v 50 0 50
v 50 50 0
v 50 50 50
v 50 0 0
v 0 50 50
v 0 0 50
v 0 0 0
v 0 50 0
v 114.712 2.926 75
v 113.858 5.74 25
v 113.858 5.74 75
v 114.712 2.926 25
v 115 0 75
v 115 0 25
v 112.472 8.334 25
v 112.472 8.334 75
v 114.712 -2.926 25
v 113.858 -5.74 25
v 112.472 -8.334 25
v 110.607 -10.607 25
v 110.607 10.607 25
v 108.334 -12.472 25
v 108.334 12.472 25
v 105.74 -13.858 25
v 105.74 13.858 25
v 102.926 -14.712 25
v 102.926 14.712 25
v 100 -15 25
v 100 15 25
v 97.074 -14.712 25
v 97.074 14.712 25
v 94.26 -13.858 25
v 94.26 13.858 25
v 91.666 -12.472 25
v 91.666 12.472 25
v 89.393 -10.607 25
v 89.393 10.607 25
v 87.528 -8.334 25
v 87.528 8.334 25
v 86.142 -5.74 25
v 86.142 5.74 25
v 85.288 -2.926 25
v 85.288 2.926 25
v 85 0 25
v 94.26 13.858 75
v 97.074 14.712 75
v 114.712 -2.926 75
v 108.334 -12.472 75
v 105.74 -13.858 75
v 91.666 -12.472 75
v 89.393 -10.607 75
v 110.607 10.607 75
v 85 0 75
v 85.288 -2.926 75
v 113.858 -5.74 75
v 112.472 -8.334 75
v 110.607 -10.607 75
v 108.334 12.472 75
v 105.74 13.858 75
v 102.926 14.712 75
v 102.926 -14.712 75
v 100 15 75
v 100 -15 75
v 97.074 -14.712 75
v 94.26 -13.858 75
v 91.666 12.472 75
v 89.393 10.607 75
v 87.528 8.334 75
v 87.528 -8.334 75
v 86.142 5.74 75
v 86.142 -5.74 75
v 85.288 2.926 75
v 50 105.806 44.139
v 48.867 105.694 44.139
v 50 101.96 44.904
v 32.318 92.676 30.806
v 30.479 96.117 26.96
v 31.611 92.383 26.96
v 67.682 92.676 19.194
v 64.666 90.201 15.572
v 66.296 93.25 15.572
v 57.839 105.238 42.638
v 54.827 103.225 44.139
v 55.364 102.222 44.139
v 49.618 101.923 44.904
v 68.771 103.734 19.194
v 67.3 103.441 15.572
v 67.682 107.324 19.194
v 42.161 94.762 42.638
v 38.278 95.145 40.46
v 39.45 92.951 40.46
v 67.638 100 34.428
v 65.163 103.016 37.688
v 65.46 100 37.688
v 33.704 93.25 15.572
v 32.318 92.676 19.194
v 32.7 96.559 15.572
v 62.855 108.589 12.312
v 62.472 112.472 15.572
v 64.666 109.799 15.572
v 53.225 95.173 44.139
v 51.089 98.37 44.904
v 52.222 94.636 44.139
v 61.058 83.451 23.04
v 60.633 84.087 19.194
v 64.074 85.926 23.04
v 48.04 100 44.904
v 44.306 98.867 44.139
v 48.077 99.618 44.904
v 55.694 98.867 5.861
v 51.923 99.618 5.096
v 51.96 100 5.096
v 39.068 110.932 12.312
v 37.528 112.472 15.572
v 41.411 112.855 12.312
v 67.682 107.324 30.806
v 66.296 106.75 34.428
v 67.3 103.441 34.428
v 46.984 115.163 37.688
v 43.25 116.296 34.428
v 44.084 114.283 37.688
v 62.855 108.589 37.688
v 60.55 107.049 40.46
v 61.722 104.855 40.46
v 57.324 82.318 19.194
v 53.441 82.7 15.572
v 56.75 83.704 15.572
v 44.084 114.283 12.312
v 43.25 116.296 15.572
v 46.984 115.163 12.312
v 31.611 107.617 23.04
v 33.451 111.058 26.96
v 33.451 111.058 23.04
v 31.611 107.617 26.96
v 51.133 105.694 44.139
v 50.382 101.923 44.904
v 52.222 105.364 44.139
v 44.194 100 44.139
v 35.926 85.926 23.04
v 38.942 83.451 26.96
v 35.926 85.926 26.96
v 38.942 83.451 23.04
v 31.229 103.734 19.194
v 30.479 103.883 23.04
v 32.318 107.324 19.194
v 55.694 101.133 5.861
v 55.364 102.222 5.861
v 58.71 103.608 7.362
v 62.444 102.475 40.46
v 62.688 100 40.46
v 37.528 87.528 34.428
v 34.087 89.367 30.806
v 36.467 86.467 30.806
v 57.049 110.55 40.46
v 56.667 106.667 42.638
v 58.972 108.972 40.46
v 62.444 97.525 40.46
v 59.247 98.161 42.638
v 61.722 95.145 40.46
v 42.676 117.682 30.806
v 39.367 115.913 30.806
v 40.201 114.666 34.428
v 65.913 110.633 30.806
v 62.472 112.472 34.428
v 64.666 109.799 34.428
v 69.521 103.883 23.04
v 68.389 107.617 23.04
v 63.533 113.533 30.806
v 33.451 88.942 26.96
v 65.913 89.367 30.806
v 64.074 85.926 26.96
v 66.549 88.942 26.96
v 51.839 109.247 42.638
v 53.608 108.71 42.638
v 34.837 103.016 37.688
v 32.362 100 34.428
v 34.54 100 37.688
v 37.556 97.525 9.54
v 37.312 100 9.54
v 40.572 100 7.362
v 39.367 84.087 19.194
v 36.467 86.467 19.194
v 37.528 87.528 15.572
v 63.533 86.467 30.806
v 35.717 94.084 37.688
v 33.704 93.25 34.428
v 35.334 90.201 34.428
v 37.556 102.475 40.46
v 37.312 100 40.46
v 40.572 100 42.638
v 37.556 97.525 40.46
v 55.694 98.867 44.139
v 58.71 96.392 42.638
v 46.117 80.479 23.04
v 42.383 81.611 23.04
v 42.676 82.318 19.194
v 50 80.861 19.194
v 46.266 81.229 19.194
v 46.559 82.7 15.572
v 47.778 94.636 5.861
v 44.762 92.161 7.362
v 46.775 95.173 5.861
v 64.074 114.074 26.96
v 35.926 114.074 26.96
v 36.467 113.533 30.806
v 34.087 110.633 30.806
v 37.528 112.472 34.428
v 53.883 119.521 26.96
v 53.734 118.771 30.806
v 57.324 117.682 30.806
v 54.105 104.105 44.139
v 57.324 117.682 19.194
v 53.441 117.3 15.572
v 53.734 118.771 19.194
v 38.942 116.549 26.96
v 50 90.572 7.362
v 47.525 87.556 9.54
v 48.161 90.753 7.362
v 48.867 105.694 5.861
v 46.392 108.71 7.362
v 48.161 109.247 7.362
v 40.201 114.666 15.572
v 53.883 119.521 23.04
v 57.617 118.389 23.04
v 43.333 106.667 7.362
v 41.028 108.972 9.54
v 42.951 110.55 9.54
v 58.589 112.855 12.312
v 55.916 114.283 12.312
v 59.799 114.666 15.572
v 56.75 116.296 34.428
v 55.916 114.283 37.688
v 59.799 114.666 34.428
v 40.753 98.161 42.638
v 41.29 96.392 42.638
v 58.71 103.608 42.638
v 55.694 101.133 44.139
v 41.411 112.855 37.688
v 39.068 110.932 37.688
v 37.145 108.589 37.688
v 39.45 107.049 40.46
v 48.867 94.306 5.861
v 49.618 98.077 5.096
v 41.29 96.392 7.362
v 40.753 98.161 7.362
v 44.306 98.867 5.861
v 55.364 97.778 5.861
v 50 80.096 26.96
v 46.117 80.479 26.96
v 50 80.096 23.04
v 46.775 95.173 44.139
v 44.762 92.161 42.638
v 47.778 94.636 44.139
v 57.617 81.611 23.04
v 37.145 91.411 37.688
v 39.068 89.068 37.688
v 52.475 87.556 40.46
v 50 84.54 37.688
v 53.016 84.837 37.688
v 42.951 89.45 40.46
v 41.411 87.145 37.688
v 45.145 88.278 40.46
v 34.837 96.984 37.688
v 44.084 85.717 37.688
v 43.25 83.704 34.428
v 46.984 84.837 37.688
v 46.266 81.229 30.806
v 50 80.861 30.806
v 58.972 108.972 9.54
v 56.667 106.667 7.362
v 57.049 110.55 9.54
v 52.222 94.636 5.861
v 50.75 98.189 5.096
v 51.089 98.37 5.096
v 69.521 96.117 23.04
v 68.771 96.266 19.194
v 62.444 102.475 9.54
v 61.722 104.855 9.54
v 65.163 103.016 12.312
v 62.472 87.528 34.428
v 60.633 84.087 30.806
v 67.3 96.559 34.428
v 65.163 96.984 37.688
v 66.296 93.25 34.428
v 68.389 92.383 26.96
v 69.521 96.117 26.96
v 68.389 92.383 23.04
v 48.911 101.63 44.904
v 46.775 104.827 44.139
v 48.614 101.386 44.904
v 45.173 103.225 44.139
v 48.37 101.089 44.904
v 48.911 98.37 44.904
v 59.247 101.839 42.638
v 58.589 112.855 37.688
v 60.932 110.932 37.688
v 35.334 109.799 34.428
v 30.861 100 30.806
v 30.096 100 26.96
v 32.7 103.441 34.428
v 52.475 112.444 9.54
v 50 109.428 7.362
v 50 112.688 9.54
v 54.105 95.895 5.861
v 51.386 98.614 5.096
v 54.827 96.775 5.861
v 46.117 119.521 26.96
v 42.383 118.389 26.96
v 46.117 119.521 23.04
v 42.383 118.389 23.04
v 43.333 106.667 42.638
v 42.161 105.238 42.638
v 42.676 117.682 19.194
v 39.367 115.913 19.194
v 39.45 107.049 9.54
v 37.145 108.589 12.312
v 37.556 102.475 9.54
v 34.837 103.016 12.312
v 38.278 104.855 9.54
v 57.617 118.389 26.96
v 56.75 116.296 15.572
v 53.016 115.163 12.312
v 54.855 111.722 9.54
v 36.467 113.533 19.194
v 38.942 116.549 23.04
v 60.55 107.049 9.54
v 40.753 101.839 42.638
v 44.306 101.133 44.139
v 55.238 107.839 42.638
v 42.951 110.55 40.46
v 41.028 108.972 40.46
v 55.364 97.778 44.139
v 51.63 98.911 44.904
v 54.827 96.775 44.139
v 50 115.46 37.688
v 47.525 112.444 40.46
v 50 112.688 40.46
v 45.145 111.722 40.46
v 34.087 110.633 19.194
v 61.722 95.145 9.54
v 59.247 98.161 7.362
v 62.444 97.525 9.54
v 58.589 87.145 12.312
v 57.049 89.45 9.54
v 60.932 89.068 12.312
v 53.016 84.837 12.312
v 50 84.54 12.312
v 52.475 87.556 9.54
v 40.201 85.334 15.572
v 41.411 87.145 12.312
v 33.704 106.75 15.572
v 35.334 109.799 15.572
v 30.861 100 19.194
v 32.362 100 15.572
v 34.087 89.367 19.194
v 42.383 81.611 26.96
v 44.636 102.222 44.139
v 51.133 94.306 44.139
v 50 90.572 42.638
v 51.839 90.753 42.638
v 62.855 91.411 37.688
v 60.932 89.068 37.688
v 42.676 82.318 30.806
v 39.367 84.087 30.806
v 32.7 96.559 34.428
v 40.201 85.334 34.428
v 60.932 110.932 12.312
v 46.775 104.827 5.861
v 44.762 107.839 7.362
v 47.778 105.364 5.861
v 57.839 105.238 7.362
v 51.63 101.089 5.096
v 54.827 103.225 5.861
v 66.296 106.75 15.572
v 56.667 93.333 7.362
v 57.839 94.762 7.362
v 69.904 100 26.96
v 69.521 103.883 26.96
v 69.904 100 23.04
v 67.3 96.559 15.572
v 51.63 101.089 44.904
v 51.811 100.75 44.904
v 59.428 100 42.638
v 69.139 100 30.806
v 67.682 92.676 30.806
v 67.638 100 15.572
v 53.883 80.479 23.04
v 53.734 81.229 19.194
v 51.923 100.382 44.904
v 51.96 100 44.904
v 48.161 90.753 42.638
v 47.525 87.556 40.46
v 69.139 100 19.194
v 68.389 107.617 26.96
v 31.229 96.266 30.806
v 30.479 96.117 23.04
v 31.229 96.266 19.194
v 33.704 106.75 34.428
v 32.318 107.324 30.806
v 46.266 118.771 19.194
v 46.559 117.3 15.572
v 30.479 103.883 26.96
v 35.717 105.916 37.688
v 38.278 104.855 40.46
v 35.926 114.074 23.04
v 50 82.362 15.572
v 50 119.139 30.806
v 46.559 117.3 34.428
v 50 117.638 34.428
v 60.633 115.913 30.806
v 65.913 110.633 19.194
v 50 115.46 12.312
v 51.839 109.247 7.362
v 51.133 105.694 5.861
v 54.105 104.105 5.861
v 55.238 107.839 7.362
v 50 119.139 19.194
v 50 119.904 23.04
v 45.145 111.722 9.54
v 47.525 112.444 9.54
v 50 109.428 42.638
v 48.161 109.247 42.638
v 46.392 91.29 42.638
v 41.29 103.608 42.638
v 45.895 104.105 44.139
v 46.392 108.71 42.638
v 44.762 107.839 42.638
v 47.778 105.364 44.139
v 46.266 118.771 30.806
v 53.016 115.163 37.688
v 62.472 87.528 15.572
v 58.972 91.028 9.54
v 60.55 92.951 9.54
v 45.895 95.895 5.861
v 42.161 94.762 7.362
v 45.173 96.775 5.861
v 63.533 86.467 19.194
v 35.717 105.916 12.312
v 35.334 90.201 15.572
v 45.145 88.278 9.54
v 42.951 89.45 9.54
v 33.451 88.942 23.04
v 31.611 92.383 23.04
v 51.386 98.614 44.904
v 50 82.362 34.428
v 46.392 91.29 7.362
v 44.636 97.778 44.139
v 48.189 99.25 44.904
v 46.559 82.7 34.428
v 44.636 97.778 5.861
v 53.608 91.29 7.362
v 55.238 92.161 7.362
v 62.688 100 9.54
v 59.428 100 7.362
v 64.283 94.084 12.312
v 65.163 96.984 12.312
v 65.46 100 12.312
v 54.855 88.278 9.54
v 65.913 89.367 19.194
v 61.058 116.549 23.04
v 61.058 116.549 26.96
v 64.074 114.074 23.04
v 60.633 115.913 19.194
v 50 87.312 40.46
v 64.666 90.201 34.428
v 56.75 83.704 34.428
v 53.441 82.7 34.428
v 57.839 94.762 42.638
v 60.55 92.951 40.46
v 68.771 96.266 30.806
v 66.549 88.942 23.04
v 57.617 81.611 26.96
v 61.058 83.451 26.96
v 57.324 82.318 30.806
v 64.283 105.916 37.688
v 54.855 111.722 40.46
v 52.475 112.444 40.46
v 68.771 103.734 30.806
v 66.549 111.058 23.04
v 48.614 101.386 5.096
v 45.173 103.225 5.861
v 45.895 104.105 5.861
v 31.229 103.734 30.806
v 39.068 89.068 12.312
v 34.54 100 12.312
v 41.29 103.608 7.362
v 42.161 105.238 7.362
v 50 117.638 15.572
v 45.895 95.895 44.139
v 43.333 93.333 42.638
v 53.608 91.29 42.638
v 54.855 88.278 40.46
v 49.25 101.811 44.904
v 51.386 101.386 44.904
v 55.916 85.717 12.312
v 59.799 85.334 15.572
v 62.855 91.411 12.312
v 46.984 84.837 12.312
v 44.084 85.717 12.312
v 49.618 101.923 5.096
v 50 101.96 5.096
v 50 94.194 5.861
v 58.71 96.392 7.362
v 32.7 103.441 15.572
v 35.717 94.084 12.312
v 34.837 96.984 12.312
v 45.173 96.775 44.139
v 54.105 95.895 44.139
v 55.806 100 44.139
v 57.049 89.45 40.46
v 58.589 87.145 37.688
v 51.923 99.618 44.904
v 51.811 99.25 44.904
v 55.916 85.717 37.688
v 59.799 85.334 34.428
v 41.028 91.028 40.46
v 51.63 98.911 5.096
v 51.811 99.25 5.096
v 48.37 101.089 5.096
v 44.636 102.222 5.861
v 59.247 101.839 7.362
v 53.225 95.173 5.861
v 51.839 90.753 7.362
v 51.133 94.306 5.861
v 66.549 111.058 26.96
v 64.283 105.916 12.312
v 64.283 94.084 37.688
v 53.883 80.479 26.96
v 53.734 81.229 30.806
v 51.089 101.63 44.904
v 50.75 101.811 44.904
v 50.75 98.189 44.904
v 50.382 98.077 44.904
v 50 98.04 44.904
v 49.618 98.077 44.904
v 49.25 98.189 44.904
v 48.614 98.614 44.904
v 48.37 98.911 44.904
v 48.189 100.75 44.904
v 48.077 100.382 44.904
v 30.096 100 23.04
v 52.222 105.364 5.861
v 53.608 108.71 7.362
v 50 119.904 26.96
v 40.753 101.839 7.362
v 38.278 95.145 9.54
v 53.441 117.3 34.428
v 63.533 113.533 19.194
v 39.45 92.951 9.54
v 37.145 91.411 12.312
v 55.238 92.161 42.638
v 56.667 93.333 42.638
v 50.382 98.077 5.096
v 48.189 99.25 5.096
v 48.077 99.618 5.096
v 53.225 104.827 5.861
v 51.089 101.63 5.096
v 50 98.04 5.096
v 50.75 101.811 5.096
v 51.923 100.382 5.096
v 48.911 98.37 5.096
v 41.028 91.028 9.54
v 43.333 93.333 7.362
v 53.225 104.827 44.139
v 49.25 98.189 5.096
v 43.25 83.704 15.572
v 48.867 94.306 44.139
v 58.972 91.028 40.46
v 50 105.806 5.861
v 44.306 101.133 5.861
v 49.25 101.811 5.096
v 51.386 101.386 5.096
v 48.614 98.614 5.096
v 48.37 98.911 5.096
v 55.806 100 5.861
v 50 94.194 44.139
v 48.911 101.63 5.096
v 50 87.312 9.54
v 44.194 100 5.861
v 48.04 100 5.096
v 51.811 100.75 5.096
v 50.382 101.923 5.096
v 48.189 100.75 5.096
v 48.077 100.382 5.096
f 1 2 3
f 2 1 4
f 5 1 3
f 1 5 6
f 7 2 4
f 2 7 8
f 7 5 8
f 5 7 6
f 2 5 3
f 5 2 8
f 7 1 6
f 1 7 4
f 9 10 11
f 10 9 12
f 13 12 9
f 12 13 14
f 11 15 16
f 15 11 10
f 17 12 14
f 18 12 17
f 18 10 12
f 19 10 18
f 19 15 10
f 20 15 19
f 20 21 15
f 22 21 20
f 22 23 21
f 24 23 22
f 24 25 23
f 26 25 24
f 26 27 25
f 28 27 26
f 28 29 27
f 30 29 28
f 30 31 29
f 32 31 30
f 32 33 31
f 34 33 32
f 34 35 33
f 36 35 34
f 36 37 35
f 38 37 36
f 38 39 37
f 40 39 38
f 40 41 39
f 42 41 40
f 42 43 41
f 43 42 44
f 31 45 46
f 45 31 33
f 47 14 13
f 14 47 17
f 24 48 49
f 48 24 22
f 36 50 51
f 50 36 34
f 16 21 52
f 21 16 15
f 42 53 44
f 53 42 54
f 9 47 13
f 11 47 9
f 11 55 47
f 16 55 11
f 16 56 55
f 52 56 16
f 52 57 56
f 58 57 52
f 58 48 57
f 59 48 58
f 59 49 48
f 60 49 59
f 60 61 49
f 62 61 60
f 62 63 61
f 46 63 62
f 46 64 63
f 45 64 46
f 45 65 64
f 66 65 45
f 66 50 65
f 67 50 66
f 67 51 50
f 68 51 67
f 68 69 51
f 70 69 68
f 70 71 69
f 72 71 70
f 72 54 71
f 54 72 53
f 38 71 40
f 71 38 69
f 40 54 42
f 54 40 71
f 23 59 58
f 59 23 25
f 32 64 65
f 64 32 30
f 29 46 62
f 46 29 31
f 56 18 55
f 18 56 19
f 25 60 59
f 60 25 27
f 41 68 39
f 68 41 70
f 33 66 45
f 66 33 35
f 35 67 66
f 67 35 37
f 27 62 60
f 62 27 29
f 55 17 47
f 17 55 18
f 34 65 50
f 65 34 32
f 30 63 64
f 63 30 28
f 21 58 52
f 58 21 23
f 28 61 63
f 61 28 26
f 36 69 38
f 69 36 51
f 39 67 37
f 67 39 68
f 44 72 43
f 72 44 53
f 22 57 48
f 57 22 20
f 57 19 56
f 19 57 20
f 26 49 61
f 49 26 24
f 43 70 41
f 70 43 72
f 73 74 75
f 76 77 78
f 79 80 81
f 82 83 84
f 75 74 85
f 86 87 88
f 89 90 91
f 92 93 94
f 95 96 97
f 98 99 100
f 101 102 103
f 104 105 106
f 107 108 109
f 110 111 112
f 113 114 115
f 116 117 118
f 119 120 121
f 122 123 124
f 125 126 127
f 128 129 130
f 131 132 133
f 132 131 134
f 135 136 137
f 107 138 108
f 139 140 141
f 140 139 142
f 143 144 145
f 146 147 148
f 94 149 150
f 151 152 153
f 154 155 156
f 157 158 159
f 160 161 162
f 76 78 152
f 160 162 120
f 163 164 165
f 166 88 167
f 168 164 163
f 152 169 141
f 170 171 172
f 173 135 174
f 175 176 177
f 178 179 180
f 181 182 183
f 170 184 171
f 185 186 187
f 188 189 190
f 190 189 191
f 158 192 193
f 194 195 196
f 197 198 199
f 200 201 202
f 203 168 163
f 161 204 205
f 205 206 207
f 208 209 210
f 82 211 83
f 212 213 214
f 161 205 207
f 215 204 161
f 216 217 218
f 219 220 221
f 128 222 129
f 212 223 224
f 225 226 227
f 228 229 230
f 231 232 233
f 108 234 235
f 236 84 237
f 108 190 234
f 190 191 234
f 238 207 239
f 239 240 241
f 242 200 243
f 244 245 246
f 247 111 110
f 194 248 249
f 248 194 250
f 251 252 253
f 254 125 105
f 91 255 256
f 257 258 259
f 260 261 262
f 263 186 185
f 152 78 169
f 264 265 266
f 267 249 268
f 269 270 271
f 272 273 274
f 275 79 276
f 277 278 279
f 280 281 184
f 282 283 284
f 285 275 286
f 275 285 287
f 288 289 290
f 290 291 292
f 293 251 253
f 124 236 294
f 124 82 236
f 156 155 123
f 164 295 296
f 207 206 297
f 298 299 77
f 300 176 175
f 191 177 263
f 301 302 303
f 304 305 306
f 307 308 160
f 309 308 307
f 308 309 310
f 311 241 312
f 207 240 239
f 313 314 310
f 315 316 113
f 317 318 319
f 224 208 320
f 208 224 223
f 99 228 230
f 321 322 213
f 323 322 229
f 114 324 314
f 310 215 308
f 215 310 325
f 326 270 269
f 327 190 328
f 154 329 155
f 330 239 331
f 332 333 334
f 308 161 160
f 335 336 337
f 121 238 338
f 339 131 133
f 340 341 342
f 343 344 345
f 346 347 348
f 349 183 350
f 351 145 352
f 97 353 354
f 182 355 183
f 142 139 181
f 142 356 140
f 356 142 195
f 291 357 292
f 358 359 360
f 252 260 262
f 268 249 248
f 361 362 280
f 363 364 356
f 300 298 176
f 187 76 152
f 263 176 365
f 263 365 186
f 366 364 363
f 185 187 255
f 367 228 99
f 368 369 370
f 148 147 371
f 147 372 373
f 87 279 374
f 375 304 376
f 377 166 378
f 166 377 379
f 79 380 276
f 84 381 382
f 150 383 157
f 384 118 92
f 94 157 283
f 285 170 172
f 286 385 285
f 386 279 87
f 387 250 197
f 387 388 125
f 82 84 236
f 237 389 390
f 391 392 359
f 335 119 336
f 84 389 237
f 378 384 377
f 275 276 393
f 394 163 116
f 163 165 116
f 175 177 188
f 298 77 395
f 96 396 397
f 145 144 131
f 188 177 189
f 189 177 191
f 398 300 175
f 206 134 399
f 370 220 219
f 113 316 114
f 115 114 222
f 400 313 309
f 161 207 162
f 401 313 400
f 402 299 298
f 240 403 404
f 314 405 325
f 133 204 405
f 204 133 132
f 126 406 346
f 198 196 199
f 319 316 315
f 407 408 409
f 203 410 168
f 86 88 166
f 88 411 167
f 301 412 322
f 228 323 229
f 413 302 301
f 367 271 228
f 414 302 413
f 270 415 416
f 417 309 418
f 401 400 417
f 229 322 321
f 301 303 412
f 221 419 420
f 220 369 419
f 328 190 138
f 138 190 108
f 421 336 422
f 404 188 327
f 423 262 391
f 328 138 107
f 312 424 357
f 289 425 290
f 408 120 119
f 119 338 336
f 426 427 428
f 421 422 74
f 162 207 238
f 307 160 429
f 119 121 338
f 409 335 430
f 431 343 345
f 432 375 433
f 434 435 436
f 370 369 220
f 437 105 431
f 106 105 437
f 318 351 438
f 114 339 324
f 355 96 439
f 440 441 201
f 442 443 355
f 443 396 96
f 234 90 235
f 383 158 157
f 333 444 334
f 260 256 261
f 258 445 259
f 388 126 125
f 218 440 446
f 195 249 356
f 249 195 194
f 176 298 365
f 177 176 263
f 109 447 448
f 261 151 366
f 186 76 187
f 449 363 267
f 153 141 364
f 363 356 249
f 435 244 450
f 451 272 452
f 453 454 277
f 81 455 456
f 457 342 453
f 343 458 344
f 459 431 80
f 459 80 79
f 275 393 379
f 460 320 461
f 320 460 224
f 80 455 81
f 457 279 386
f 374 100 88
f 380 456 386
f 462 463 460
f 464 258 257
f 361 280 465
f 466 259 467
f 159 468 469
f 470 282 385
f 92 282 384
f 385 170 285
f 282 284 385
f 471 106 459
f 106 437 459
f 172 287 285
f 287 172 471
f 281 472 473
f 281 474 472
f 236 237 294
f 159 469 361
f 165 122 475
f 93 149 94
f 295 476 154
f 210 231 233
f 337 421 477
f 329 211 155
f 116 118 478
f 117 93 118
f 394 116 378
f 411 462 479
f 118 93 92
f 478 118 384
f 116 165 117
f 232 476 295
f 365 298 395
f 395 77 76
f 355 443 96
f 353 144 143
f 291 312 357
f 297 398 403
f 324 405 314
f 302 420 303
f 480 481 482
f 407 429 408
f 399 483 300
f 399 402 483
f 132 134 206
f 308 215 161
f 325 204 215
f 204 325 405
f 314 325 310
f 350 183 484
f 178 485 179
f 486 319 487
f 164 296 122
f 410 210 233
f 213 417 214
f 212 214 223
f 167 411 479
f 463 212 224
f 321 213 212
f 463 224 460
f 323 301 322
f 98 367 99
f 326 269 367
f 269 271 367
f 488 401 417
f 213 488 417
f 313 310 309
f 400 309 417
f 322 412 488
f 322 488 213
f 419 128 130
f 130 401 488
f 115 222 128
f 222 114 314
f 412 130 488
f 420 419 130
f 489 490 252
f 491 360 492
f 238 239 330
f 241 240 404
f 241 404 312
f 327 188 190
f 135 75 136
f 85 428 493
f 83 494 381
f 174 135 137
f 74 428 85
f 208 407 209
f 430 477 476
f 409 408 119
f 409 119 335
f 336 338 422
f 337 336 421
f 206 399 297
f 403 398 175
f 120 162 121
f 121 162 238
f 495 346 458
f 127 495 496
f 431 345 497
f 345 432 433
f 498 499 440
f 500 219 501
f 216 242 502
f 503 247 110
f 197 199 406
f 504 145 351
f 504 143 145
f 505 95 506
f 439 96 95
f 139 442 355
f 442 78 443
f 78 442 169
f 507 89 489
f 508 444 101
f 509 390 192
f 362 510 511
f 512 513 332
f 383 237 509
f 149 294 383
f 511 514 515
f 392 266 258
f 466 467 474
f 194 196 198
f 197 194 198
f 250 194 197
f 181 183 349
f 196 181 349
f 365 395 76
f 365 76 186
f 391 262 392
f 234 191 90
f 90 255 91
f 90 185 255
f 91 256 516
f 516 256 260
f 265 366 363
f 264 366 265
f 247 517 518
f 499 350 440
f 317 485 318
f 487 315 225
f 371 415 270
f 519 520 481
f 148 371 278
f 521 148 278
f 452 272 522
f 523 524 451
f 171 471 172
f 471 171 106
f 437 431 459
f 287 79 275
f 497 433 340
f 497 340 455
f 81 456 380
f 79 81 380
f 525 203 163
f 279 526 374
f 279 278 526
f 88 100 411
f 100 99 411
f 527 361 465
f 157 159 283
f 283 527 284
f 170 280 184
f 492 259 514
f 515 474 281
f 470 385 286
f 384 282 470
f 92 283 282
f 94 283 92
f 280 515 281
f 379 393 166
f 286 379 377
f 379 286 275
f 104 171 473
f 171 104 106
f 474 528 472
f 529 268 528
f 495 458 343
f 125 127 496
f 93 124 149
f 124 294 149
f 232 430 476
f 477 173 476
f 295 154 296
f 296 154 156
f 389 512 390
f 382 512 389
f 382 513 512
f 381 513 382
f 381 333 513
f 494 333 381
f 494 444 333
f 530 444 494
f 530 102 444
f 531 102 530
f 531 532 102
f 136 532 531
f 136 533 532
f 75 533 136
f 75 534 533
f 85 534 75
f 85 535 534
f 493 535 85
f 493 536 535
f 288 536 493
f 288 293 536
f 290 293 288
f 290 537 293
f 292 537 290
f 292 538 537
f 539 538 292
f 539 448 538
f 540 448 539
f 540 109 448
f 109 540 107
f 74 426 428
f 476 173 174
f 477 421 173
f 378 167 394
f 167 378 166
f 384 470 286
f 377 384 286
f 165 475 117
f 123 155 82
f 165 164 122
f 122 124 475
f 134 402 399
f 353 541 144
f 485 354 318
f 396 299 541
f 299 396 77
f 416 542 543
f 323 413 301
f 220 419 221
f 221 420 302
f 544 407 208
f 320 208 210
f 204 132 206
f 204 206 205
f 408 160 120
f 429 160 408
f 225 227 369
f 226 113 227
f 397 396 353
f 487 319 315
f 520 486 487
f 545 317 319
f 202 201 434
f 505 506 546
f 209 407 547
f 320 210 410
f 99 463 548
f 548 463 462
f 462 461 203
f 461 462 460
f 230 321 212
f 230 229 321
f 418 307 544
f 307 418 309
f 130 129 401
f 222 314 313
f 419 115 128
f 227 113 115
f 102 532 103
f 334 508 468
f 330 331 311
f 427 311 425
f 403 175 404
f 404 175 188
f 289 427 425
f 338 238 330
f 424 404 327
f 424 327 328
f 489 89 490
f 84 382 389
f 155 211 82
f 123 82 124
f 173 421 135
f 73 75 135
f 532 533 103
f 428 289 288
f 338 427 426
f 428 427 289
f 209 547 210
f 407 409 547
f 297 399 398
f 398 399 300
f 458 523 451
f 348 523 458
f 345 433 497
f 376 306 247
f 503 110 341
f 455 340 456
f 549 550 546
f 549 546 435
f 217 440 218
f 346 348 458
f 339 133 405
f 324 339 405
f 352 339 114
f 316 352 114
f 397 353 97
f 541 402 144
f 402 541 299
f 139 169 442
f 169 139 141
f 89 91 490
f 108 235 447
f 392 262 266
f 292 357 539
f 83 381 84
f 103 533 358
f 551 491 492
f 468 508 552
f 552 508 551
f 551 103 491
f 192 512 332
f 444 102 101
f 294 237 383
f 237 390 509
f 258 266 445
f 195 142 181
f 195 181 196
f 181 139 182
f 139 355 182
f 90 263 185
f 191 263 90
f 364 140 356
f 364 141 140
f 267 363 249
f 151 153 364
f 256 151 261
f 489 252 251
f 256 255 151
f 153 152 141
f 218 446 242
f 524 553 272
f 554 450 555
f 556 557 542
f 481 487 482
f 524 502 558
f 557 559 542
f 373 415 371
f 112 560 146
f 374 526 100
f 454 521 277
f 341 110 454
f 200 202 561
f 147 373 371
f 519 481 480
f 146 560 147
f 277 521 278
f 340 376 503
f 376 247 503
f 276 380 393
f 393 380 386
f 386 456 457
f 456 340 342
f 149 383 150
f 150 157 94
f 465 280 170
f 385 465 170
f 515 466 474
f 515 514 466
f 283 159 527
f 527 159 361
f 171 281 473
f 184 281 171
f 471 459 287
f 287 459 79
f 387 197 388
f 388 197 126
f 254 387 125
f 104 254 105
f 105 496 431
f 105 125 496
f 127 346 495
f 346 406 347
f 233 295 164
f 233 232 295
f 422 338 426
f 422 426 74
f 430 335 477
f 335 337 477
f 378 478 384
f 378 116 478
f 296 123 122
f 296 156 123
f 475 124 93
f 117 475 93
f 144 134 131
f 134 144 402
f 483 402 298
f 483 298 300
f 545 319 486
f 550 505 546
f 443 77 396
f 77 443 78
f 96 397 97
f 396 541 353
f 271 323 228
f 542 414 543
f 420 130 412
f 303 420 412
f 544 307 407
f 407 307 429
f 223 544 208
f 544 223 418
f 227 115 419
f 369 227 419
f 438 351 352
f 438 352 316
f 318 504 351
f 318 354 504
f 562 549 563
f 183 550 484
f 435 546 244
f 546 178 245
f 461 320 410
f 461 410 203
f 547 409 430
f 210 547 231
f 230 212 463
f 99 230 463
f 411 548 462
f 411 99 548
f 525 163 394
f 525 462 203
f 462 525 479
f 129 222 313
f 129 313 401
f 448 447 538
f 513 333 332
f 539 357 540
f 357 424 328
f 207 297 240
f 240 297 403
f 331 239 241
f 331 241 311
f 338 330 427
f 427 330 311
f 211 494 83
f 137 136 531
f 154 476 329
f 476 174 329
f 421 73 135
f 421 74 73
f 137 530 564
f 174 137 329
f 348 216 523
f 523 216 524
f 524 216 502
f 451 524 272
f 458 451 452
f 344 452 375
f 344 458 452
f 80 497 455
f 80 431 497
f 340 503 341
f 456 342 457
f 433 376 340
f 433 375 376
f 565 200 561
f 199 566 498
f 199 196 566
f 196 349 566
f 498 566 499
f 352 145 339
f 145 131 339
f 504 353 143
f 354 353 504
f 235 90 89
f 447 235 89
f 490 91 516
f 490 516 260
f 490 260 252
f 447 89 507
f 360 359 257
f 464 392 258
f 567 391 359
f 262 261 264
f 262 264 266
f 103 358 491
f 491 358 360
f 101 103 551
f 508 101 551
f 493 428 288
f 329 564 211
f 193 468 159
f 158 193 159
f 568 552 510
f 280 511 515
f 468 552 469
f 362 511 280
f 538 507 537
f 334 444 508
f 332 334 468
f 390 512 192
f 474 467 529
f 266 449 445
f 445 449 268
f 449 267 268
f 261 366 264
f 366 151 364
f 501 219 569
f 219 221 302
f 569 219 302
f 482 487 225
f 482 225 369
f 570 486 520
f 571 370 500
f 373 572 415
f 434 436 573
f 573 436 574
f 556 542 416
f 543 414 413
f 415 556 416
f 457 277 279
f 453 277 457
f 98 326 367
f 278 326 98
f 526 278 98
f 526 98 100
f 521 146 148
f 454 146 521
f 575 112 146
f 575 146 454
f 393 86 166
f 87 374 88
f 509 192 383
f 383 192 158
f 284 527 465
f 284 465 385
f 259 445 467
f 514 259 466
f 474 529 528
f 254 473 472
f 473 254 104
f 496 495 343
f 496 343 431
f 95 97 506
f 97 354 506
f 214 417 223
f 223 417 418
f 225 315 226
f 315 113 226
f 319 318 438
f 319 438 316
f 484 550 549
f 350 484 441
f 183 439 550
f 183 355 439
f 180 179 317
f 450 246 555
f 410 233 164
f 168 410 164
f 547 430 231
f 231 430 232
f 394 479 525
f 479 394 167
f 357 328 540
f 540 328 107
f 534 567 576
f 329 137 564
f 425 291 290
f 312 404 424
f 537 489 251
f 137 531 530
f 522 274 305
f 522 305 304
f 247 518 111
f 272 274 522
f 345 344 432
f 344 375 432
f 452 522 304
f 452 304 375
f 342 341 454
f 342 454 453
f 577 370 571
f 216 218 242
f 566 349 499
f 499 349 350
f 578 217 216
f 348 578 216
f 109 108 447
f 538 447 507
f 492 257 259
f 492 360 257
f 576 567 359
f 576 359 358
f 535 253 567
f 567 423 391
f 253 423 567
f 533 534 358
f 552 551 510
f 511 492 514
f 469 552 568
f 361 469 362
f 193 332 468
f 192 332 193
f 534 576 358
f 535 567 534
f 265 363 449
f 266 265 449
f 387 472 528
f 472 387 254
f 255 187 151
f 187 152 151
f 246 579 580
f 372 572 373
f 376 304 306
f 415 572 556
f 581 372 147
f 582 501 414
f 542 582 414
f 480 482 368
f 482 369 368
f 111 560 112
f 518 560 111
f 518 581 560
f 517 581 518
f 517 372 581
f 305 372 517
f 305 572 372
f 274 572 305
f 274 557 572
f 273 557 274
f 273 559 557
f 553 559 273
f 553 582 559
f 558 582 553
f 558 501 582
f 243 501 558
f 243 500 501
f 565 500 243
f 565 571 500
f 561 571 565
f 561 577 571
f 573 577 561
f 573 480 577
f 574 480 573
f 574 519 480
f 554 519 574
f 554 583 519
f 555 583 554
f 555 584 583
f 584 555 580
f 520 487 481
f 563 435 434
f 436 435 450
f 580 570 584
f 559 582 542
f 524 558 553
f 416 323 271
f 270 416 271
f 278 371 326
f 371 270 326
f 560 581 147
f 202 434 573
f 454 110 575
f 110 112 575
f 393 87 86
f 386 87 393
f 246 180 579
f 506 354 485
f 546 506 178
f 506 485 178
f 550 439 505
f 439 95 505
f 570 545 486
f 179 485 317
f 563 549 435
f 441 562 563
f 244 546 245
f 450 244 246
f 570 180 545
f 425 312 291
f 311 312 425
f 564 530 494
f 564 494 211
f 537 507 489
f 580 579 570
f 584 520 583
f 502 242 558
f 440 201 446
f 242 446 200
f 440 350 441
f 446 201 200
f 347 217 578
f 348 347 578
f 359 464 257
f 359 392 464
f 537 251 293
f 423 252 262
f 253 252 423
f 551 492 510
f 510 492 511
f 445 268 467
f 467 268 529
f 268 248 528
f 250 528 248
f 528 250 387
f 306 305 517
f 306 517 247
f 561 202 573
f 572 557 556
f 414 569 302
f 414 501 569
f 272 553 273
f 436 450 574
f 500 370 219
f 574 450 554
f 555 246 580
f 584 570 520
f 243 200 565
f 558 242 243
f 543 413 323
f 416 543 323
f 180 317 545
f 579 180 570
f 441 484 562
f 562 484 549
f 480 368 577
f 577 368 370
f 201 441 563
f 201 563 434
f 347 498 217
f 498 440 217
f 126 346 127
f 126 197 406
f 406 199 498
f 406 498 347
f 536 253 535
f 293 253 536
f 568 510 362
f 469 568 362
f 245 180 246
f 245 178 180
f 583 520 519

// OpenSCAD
// SIMPLE TEST - Just to verify OpenSCAD is rendering

// Test 1: Basic cube
color("red")
translate([0, 0, 0])
    cube([50, 50, 50]);

// Test 2: Basic cylinder
color("blue")
translate([100, 0, 25])
    cylinder(h=50, d=30, $fn=32);

// Test 3: Basic sphere
color("green")
translate([50, 100, 25])
    sphere(d=40, $fn=32);

echo("If you see this message, OpenSCAD is working!");
echo("You should see: red cube, blue cylinder, green sphere");
